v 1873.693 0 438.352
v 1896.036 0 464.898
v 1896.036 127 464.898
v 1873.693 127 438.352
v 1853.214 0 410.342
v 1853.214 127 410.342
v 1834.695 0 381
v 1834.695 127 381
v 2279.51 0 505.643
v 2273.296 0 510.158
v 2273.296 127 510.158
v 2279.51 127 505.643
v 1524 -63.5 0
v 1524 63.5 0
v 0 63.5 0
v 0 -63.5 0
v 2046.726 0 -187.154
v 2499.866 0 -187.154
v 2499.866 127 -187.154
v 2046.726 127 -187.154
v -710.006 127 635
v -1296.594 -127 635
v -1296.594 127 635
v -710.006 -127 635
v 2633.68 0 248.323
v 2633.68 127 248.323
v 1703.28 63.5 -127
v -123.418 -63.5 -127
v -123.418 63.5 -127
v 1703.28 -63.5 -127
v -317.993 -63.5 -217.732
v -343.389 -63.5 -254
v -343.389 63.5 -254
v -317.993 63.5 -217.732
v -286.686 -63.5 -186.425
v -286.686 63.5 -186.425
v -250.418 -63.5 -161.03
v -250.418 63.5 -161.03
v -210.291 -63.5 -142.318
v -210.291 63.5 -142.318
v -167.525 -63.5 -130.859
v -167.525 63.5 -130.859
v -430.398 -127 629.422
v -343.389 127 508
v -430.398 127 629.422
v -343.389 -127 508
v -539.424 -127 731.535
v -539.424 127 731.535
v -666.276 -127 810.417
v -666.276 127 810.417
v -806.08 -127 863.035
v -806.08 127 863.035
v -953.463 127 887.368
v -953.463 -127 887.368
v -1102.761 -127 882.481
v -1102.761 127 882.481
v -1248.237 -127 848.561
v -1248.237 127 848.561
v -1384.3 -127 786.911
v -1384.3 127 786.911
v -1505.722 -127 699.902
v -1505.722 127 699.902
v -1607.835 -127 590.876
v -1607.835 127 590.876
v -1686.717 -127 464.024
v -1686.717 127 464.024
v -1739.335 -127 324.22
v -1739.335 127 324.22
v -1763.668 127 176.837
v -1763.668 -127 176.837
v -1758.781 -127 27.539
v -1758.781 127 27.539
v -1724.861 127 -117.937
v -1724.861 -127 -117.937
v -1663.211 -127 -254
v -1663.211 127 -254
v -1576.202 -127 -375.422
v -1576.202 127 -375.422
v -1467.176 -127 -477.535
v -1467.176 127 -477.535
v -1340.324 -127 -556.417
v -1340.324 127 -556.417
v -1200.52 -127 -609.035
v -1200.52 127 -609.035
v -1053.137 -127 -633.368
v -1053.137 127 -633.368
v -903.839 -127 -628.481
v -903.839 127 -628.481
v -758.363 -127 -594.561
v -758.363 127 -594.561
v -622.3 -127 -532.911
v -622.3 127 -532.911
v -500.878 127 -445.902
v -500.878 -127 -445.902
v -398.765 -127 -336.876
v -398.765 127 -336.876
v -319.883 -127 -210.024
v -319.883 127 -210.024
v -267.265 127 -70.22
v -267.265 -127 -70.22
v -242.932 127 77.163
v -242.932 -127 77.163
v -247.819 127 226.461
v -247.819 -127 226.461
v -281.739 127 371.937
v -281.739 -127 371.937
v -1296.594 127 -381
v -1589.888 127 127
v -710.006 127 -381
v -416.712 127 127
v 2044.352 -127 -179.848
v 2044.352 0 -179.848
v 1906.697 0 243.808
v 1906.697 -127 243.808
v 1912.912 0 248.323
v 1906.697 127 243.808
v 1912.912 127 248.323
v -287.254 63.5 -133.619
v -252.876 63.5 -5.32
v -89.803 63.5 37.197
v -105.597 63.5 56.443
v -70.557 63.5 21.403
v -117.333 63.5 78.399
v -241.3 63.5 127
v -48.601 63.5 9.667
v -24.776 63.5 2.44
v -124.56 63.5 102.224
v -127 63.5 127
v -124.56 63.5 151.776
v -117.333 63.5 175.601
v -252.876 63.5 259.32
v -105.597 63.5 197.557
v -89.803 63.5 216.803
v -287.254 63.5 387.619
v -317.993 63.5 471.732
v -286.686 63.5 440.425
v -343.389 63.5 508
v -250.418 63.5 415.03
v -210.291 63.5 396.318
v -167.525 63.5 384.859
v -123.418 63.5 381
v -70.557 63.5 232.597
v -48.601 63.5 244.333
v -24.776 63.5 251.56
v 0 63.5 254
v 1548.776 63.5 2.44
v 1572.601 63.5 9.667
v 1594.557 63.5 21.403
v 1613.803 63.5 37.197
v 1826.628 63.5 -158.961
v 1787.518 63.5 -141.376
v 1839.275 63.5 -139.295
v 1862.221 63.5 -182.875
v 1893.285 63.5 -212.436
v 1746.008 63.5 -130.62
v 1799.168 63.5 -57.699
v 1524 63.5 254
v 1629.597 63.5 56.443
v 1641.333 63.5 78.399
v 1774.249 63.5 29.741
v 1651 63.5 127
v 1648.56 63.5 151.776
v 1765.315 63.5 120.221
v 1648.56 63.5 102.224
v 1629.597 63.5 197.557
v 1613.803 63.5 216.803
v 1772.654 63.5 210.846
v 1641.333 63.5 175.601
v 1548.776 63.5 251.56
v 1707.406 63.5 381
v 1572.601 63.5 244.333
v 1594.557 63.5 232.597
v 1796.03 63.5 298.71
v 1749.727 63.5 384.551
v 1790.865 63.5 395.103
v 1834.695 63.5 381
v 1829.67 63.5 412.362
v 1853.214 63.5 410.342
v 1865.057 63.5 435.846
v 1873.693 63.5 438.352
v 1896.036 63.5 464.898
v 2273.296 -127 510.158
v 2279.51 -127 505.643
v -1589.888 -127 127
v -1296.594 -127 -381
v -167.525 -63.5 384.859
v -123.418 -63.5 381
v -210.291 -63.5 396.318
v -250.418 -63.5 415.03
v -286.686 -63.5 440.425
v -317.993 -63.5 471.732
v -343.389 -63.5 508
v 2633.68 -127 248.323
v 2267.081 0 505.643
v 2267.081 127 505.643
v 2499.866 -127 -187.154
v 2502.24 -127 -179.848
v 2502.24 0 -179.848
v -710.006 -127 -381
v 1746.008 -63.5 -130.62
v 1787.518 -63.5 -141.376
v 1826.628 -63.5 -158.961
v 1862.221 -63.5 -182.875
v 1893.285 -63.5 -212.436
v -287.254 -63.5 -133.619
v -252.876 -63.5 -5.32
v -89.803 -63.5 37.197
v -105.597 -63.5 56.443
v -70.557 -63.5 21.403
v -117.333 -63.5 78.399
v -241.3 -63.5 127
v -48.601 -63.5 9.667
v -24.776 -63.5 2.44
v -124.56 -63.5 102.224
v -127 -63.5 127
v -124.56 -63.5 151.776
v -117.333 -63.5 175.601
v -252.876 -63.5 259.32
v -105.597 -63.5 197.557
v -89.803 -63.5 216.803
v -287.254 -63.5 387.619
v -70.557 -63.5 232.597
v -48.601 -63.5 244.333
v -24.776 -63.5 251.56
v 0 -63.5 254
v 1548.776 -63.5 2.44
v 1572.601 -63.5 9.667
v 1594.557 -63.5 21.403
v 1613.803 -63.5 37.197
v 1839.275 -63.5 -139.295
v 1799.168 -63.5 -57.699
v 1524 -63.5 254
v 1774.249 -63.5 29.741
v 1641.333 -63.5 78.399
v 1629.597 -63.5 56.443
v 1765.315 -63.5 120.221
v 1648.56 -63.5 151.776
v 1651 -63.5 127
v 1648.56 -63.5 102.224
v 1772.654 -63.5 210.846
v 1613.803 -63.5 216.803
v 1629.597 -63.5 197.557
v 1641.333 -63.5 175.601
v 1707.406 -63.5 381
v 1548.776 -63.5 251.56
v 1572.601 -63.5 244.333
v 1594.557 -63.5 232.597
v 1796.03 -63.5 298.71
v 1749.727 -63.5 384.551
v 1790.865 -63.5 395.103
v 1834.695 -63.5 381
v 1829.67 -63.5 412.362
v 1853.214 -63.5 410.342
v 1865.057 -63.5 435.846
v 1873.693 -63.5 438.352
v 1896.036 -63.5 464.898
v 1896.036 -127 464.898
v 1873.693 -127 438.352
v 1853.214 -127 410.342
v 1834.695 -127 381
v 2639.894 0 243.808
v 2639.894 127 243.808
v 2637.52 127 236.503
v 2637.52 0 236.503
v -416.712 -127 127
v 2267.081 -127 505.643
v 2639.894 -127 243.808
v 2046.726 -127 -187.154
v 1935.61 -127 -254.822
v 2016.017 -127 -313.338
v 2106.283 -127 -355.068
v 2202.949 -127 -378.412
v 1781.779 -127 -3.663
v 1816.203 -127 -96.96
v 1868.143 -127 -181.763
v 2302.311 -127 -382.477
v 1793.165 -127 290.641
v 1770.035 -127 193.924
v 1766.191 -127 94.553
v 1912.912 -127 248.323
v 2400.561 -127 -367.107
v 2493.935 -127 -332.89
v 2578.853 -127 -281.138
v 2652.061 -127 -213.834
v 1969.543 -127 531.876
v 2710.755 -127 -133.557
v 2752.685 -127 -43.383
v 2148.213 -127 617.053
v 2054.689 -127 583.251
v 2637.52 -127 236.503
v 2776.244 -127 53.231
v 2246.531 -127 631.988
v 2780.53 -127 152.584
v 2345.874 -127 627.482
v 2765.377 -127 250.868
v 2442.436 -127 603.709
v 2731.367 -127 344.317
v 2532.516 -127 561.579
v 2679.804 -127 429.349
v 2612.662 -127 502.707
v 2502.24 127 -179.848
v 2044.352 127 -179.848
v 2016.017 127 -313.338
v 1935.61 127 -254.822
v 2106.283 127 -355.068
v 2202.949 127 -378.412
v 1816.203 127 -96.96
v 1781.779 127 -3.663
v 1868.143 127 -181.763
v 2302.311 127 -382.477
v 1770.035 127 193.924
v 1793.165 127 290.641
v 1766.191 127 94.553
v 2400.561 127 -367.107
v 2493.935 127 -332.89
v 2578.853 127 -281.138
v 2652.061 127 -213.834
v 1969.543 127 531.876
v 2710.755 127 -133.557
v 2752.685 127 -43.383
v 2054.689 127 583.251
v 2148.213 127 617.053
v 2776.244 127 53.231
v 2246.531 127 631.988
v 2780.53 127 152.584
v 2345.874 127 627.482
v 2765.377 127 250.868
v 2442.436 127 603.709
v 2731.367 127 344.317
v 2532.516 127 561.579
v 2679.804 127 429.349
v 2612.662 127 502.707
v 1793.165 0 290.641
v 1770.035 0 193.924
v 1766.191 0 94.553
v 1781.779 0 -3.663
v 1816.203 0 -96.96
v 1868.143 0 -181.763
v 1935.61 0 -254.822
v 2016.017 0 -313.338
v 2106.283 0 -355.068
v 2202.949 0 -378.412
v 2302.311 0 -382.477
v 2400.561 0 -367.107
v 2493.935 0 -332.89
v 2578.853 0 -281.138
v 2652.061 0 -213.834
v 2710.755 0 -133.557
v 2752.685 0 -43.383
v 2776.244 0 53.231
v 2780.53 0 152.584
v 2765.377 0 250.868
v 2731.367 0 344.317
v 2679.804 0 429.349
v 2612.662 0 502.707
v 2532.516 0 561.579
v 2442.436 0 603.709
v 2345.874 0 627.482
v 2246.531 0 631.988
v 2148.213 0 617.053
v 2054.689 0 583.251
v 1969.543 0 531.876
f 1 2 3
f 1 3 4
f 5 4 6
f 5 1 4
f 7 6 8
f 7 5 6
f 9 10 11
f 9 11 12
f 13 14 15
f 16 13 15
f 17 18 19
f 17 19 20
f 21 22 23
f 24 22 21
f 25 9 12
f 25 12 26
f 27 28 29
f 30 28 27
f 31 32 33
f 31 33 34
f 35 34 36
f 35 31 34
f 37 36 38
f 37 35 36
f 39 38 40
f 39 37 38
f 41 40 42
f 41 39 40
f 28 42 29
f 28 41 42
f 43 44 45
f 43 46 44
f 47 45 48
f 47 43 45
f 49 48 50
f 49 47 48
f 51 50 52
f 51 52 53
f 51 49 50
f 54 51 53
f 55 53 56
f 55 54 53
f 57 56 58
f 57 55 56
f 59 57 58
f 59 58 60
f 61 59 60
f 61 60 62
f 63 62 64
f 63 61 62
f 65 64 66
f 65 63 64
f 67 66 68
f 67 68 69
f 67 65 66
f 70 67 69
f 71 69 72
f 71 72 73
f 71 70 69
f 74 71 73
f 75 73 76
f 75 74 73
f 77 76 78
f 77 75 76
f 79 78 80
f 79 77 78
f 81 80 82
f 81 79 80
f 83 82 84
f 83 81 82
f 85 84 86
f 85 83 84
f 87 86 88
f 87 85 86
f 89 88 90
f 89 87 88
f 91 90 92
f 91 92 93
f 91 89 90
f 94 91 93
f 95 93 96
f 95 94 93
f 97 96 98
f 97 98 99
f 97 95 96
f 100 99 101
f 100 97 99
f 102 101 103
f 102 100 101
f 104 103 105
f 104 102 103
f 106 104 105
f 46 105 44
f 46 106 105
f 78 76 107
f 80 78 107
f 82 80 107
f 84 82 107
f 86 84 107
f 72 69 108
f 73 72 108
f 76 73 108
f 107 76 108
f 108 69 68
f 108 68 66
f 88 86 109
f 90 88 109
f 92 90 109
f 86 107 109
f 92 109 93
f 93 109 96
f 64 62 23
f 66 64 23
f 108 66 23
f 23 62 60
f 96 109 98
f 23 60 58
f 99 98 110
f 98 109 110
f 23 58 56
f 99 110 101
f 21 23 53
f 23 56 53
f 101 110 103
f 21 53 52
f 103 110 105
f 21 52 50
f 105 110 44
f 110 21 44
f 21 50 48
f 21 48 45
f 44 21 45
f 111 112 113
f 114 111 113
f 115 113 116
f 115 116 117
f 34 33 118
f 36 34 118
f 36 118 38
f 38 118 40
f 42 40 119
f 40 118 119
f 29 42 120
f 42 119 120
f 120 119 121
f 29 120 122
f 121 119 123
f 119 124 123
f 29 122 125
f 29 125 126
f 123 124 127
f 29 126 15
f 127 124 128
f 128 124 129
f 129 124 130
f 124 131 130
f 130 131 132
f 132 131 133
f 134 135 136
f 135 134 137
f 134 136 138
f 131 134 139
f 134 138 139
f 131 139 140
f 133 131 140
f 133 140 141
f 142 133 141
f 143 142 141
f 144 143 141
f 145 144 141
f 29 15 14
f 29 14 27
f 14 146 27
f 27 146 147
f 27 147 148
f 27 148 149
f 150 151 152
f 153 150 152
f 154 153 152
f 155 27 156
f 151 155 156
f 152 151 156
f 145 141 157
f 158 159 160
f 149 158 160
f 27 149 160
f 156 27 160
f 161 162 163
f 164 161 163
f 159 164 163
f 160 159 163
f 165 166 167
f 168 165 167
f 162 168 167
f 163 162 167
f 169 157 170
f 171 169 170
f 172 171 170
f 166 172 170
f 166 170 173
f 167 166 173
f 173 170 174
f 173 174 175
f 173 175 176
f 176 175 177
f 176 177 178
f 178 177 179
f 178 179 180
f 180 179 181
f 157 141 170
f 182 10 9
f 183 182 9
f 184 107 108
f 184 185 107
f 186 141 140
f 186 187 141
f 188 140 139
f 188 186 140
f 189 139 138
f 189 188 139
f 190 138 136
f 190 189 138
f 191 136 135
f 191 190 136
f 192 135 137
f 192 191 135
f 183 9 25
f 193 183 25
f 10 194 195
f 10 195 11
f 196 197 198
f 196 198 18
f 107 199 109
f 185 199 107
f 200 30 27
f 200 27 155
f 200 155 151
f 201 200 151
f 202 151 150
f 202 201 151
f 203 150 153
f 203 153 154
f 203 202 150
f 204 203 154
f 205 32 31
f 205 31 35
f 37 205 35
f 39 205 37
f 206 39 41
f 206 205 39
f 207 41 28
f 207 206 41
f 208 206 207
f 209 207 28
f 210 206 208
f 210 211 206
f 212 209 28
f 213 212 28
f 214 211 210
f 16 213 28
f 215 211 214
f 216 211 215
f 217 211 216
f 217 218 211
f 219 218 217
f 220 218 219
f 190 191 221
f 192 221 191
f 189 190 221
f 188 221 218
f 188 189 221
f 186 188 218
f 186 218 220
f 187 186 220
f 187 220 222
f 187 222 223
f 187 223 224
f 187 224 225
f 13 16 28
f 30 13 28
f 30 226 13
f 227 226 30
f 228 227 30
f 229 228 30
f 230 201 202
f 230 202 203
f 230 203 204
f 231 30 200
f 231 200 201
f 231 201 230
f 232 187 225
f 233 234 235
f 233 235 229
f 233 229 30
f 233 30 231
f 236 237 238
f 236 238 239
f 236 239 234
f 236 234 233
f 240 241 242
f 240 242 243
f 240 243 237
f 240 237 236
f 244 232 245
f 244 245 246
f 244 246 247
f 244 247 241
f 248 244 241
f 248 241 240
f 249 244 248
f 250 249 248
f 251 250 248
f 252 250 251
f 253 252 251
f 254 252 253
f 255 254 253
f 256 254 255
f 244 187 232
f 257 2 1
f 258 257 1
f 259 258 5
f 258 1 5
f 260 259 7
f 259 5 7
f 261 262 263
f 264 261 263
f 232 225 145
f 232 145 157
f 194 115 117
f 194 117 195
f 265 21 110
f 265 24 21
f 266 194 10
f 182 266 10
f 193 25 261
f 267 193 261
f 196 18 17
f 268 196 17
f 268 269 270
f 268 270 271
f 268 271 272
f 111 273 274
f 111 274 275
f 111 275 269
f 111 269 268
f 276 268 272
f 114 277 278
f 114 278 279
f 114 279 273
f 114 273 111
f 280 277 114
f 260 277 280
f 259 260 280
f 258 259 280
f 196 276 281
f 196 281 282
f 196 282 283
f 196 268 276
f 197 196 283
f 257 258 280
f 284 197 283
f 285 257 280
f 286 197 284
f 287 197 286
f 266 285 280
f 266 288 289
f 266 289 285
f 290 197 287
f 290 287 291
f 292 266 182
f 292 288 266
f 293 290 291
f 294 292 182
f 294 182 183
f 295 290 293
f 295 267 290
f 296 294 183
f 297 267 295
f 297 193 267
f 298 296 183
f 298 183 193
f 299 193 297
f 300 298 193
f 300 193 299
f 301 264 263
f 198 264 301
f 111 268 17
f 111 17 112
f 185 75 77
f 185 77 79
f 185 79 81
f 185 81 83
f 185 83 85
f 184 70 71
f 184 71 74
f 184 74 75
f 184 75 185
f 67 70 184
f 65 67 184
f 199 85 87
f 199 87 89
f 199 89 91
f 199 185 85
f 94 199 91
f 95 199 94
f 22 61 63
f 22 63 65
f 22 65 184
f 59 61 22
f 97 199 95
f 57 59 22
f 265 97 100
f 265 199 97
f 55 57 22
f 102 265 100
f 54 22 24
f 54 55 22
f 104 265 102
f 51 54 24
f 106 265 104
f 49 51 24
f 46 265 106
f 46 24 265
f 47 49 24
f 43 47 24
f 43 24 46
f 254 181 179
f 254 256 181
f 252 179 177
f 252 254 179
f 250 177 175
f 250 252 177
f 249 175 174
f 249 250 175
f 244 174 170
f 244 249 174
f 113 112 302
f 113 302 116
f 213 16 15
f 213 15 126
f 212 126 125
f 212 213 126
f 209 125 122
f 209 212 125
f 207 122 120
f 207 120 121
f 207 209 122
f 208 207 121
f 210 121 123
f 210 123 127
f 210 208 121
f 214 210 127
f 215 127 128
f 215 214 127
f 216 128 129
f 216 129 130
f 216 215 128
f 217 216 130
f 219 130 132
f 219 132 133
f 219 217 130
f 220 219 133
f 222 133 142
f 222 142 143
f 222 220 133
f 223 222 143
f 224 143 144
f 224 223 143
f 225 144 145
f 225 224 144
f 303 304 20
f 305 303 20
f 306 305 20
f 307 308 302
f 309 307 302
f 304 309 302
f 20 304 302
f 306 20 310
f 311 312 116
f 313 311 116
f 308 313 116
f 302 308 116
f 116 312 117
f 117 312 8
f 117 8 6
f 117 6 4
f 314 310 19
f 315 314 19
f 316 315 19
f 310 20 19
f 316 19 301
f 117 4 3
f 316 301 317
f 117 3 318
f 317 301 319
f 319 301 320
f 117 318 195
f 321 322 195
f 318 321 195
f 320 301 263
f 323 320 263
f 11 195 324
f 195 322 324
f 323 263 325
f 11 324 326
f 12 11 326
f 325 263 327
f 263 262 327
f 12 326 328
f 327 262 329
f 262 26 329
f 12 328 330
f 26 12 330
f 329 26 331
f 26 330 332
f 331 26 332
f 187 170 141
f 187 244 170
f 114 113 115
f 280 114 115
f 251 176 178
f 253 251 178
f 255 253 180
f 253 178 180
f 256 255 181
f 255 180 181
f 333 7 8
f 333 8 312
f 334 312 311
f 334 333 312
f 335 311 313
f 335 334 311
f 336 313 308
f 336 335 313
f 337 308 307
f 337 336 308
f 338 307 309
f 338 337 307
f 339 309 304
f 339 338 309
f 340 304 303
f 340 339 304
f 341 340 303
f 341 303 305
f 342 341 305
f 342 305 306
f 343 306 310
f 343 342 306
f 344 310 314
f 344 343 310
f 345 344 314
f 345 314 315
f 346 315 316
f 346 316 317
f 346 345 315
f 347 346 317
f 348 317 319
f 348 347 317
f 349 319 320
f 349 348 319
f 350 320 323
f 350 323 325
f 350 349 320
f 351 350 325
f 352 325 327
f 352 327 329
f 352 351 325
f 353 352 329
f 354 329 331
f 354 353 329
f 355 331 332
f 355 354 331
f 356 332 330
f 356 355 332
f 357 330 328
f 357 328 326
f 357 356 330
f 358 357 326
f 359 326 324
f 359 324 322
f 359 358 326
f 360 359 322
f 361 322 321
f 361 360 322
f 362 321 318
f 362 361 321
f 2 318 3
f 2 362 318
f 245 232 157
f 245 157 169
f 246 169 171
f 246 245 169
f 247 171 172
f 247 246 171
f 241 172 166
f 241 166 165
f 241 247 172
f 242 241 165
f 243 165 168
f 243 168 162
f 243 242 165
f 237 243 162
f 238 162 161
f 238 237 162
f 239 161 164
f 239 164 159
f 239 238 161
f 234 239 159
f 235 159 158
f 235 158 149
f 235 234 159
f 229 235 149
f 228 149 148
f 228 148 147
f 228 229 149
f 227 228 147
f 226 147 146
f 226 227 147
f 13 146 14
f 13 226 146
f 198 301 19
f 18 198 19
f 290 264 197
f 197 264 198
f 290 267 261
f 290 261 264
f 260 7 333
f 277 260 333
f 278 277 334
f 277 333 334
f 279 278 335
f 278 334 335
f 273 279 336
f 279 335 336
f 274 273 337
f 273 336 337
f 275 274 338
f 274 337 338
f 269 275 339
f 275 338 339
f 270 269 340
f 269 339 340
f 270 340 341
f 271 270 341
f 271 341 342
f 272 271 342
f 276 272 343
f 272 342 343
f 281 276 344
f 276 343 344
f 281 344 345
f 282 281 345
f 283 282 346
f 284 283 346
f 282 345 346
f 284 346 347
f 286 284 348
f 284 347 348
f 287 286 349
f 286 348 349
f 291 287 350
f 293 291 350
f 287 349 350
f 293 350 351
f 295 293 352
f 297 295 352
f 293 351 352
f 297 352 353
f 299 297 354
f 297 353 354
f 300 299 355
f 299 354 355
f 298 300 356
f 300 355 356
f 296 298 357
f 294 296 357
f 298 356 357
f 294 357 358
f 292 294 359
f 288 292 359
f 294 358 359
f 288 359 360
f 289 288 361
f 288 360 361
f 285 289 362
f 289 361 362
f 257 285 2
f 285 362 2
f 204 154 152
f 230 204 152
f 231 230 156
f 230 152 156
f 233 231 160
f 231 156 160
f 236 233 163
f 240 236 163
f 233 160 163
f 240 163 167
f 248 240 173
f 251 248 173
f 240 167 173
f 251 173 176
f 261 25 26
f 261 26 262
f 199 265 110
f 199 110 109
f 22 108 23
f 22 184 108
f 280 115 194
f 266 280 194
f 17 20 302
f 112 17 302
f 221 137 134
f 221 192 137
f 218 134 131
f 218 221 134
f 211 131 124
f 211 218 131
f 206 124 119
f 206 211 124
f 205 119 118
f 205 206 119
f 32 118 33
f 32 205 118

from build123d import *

# Parameters (mm, degrees)
F1_DEPTH = 127
F2_DEPTH = 63.5


with BuildPart() as f1:
    # F0 (on Front) → F1 (new body, symmetric)
    with BuildSketch(Plane.XZ):
        with BuildLine():
            ThreePointArc((-343.3886423163, -254), (-267.2645203677, -70.2201123681), (-241.3, 127))
            ThreePointArc((-241.3, 127), (-267.2645203677, 324.2201123681), (-343.3886423163, 508))
            ThreePointArc((-343.3886423163, 508), (-1765.3, 127), (-343.3886423163, -254))
        make_face()
        Polygon((-416.7121265033, 127), (-710.0060632517, -381), (-1296.5939367483, -381), (-1589.8878734967, 127), (-1296.5939367483, 635), (-710.0060632517, 635), align=None, mode=Mode.SUBTRACT)
    extrude(amount=F1_DEPTH, both=True)


with BuildPart() as f1b:
    # F0 (on Front) → F1, piece 2 (new body, symmetric)
    with BuildSketch(Plane.XZ):
        with BuildLine():
            ThreePointArc((2781.2957251752, 124.6933945575), (2455.5263714034, 598.8832210777), (1896.0359158238, 464.8977981858))
            ThreePointArc((1896.0359158238, 464.8977981858), (1863.2140679876, 424.521736177), (1834.6946262179, 381))
            ThreePointArc((1834.6946262179, 381), (1767.7537116518, 74.7807452315), (1893.2850874873, -212.4355351475))
            ThreePointArc((1893.2850874873, -212.4355351475), (2453.599075192, -350.2326017543), (2781.2957251752, 124.6933945575))
        make_face()
        Polygon((2273.2957251752, 510.157635163), (2279.5099828097, 505.6427127116), (2633.6797453674, 248.3233180798), (2639.8940030018, 243.8083956284), (2637.5203678003, 236.5030976454), (2502.2395562907, -179.8484288332), (2499.8659210892, -187.1537268162), (2492.1846762233, -187.1537268162), (2054.4067741271, -187.1537268162), (2046.7255292612, -187.1537268162), (2044.3518940597, -179.8484288332), (1909.0710825501, 236.5030976455), (1906.6974473486, 243.8083956284), (1912.911704983, 248.3233180798), (2267.0814675408, 505.6427127116), align=None, mode=Mode.SUBTRACT)
    extrude(amount=F1_DEPTH, both=True)


with BuildPart() as f2:
    # F0 (on Front) → F2 (new body, symmetric)
    with BuildSketch(Plane.XZ):
        with BuildLine():
            ThreePointArc((-343.3886423163, 508), (-267.2645203677, 324.2201123681), (-241.3, 127))
            ThreePointArc((-241.3, 127), (-267.2645203677, -70.2201123681), (-343.3886423163, -254))
            ThreePointArc((-343.3886423163, -254), (-250.418189755, -161.0295474388), (-123.418189755, -127))
            Line((-123.418189755, -127), (1651, -127))
            Line((1651, -127), (1703.2797686434, -127))
            ThreePointArc((1703.2797686434, -127), (1807.4446041865, -149.3414429893), (1893.2850874873, -212.4355351475))
            ThreePointArc((1893.2850874873, -212.4355351475), (1767.7537116518, 74.7807452315), (1834.6946262179, 381))
            ThreePointArc((1834.6946262179, 381), (1863.2140679876, 424.521736177), (1896.0359158238, 464.8977981858))
            ThreePointArc((1896.0359158238, 464.8977981858), (1810.6291692551, 402.920316205), (1707.406011148, 381))
            Line((1707.406011148, 381), (1651, 381))
            Line((1651, 381), (-123.418189755, 381))
            ThreePointArc((-123.418189755, 381), (-250.418189755, 415.0295474388), (-343.3886423163, 508))
        make_face()
        with BuildLine():
            Line((1524, 0), (0, 0))
            ThreePointArc((0, 0), (-127, 127), (0, 254))
            Line((0, 254), (1524, 254))
            ThreePointArc((1524, 254), (1651, 127), (1524, 0))
        make_face(mode=Mode.SUBTRACT)
    extrude(amount=F2_DEPTH, both=True)


solid = Compound([f1.part, f1b.part, f2.part])
